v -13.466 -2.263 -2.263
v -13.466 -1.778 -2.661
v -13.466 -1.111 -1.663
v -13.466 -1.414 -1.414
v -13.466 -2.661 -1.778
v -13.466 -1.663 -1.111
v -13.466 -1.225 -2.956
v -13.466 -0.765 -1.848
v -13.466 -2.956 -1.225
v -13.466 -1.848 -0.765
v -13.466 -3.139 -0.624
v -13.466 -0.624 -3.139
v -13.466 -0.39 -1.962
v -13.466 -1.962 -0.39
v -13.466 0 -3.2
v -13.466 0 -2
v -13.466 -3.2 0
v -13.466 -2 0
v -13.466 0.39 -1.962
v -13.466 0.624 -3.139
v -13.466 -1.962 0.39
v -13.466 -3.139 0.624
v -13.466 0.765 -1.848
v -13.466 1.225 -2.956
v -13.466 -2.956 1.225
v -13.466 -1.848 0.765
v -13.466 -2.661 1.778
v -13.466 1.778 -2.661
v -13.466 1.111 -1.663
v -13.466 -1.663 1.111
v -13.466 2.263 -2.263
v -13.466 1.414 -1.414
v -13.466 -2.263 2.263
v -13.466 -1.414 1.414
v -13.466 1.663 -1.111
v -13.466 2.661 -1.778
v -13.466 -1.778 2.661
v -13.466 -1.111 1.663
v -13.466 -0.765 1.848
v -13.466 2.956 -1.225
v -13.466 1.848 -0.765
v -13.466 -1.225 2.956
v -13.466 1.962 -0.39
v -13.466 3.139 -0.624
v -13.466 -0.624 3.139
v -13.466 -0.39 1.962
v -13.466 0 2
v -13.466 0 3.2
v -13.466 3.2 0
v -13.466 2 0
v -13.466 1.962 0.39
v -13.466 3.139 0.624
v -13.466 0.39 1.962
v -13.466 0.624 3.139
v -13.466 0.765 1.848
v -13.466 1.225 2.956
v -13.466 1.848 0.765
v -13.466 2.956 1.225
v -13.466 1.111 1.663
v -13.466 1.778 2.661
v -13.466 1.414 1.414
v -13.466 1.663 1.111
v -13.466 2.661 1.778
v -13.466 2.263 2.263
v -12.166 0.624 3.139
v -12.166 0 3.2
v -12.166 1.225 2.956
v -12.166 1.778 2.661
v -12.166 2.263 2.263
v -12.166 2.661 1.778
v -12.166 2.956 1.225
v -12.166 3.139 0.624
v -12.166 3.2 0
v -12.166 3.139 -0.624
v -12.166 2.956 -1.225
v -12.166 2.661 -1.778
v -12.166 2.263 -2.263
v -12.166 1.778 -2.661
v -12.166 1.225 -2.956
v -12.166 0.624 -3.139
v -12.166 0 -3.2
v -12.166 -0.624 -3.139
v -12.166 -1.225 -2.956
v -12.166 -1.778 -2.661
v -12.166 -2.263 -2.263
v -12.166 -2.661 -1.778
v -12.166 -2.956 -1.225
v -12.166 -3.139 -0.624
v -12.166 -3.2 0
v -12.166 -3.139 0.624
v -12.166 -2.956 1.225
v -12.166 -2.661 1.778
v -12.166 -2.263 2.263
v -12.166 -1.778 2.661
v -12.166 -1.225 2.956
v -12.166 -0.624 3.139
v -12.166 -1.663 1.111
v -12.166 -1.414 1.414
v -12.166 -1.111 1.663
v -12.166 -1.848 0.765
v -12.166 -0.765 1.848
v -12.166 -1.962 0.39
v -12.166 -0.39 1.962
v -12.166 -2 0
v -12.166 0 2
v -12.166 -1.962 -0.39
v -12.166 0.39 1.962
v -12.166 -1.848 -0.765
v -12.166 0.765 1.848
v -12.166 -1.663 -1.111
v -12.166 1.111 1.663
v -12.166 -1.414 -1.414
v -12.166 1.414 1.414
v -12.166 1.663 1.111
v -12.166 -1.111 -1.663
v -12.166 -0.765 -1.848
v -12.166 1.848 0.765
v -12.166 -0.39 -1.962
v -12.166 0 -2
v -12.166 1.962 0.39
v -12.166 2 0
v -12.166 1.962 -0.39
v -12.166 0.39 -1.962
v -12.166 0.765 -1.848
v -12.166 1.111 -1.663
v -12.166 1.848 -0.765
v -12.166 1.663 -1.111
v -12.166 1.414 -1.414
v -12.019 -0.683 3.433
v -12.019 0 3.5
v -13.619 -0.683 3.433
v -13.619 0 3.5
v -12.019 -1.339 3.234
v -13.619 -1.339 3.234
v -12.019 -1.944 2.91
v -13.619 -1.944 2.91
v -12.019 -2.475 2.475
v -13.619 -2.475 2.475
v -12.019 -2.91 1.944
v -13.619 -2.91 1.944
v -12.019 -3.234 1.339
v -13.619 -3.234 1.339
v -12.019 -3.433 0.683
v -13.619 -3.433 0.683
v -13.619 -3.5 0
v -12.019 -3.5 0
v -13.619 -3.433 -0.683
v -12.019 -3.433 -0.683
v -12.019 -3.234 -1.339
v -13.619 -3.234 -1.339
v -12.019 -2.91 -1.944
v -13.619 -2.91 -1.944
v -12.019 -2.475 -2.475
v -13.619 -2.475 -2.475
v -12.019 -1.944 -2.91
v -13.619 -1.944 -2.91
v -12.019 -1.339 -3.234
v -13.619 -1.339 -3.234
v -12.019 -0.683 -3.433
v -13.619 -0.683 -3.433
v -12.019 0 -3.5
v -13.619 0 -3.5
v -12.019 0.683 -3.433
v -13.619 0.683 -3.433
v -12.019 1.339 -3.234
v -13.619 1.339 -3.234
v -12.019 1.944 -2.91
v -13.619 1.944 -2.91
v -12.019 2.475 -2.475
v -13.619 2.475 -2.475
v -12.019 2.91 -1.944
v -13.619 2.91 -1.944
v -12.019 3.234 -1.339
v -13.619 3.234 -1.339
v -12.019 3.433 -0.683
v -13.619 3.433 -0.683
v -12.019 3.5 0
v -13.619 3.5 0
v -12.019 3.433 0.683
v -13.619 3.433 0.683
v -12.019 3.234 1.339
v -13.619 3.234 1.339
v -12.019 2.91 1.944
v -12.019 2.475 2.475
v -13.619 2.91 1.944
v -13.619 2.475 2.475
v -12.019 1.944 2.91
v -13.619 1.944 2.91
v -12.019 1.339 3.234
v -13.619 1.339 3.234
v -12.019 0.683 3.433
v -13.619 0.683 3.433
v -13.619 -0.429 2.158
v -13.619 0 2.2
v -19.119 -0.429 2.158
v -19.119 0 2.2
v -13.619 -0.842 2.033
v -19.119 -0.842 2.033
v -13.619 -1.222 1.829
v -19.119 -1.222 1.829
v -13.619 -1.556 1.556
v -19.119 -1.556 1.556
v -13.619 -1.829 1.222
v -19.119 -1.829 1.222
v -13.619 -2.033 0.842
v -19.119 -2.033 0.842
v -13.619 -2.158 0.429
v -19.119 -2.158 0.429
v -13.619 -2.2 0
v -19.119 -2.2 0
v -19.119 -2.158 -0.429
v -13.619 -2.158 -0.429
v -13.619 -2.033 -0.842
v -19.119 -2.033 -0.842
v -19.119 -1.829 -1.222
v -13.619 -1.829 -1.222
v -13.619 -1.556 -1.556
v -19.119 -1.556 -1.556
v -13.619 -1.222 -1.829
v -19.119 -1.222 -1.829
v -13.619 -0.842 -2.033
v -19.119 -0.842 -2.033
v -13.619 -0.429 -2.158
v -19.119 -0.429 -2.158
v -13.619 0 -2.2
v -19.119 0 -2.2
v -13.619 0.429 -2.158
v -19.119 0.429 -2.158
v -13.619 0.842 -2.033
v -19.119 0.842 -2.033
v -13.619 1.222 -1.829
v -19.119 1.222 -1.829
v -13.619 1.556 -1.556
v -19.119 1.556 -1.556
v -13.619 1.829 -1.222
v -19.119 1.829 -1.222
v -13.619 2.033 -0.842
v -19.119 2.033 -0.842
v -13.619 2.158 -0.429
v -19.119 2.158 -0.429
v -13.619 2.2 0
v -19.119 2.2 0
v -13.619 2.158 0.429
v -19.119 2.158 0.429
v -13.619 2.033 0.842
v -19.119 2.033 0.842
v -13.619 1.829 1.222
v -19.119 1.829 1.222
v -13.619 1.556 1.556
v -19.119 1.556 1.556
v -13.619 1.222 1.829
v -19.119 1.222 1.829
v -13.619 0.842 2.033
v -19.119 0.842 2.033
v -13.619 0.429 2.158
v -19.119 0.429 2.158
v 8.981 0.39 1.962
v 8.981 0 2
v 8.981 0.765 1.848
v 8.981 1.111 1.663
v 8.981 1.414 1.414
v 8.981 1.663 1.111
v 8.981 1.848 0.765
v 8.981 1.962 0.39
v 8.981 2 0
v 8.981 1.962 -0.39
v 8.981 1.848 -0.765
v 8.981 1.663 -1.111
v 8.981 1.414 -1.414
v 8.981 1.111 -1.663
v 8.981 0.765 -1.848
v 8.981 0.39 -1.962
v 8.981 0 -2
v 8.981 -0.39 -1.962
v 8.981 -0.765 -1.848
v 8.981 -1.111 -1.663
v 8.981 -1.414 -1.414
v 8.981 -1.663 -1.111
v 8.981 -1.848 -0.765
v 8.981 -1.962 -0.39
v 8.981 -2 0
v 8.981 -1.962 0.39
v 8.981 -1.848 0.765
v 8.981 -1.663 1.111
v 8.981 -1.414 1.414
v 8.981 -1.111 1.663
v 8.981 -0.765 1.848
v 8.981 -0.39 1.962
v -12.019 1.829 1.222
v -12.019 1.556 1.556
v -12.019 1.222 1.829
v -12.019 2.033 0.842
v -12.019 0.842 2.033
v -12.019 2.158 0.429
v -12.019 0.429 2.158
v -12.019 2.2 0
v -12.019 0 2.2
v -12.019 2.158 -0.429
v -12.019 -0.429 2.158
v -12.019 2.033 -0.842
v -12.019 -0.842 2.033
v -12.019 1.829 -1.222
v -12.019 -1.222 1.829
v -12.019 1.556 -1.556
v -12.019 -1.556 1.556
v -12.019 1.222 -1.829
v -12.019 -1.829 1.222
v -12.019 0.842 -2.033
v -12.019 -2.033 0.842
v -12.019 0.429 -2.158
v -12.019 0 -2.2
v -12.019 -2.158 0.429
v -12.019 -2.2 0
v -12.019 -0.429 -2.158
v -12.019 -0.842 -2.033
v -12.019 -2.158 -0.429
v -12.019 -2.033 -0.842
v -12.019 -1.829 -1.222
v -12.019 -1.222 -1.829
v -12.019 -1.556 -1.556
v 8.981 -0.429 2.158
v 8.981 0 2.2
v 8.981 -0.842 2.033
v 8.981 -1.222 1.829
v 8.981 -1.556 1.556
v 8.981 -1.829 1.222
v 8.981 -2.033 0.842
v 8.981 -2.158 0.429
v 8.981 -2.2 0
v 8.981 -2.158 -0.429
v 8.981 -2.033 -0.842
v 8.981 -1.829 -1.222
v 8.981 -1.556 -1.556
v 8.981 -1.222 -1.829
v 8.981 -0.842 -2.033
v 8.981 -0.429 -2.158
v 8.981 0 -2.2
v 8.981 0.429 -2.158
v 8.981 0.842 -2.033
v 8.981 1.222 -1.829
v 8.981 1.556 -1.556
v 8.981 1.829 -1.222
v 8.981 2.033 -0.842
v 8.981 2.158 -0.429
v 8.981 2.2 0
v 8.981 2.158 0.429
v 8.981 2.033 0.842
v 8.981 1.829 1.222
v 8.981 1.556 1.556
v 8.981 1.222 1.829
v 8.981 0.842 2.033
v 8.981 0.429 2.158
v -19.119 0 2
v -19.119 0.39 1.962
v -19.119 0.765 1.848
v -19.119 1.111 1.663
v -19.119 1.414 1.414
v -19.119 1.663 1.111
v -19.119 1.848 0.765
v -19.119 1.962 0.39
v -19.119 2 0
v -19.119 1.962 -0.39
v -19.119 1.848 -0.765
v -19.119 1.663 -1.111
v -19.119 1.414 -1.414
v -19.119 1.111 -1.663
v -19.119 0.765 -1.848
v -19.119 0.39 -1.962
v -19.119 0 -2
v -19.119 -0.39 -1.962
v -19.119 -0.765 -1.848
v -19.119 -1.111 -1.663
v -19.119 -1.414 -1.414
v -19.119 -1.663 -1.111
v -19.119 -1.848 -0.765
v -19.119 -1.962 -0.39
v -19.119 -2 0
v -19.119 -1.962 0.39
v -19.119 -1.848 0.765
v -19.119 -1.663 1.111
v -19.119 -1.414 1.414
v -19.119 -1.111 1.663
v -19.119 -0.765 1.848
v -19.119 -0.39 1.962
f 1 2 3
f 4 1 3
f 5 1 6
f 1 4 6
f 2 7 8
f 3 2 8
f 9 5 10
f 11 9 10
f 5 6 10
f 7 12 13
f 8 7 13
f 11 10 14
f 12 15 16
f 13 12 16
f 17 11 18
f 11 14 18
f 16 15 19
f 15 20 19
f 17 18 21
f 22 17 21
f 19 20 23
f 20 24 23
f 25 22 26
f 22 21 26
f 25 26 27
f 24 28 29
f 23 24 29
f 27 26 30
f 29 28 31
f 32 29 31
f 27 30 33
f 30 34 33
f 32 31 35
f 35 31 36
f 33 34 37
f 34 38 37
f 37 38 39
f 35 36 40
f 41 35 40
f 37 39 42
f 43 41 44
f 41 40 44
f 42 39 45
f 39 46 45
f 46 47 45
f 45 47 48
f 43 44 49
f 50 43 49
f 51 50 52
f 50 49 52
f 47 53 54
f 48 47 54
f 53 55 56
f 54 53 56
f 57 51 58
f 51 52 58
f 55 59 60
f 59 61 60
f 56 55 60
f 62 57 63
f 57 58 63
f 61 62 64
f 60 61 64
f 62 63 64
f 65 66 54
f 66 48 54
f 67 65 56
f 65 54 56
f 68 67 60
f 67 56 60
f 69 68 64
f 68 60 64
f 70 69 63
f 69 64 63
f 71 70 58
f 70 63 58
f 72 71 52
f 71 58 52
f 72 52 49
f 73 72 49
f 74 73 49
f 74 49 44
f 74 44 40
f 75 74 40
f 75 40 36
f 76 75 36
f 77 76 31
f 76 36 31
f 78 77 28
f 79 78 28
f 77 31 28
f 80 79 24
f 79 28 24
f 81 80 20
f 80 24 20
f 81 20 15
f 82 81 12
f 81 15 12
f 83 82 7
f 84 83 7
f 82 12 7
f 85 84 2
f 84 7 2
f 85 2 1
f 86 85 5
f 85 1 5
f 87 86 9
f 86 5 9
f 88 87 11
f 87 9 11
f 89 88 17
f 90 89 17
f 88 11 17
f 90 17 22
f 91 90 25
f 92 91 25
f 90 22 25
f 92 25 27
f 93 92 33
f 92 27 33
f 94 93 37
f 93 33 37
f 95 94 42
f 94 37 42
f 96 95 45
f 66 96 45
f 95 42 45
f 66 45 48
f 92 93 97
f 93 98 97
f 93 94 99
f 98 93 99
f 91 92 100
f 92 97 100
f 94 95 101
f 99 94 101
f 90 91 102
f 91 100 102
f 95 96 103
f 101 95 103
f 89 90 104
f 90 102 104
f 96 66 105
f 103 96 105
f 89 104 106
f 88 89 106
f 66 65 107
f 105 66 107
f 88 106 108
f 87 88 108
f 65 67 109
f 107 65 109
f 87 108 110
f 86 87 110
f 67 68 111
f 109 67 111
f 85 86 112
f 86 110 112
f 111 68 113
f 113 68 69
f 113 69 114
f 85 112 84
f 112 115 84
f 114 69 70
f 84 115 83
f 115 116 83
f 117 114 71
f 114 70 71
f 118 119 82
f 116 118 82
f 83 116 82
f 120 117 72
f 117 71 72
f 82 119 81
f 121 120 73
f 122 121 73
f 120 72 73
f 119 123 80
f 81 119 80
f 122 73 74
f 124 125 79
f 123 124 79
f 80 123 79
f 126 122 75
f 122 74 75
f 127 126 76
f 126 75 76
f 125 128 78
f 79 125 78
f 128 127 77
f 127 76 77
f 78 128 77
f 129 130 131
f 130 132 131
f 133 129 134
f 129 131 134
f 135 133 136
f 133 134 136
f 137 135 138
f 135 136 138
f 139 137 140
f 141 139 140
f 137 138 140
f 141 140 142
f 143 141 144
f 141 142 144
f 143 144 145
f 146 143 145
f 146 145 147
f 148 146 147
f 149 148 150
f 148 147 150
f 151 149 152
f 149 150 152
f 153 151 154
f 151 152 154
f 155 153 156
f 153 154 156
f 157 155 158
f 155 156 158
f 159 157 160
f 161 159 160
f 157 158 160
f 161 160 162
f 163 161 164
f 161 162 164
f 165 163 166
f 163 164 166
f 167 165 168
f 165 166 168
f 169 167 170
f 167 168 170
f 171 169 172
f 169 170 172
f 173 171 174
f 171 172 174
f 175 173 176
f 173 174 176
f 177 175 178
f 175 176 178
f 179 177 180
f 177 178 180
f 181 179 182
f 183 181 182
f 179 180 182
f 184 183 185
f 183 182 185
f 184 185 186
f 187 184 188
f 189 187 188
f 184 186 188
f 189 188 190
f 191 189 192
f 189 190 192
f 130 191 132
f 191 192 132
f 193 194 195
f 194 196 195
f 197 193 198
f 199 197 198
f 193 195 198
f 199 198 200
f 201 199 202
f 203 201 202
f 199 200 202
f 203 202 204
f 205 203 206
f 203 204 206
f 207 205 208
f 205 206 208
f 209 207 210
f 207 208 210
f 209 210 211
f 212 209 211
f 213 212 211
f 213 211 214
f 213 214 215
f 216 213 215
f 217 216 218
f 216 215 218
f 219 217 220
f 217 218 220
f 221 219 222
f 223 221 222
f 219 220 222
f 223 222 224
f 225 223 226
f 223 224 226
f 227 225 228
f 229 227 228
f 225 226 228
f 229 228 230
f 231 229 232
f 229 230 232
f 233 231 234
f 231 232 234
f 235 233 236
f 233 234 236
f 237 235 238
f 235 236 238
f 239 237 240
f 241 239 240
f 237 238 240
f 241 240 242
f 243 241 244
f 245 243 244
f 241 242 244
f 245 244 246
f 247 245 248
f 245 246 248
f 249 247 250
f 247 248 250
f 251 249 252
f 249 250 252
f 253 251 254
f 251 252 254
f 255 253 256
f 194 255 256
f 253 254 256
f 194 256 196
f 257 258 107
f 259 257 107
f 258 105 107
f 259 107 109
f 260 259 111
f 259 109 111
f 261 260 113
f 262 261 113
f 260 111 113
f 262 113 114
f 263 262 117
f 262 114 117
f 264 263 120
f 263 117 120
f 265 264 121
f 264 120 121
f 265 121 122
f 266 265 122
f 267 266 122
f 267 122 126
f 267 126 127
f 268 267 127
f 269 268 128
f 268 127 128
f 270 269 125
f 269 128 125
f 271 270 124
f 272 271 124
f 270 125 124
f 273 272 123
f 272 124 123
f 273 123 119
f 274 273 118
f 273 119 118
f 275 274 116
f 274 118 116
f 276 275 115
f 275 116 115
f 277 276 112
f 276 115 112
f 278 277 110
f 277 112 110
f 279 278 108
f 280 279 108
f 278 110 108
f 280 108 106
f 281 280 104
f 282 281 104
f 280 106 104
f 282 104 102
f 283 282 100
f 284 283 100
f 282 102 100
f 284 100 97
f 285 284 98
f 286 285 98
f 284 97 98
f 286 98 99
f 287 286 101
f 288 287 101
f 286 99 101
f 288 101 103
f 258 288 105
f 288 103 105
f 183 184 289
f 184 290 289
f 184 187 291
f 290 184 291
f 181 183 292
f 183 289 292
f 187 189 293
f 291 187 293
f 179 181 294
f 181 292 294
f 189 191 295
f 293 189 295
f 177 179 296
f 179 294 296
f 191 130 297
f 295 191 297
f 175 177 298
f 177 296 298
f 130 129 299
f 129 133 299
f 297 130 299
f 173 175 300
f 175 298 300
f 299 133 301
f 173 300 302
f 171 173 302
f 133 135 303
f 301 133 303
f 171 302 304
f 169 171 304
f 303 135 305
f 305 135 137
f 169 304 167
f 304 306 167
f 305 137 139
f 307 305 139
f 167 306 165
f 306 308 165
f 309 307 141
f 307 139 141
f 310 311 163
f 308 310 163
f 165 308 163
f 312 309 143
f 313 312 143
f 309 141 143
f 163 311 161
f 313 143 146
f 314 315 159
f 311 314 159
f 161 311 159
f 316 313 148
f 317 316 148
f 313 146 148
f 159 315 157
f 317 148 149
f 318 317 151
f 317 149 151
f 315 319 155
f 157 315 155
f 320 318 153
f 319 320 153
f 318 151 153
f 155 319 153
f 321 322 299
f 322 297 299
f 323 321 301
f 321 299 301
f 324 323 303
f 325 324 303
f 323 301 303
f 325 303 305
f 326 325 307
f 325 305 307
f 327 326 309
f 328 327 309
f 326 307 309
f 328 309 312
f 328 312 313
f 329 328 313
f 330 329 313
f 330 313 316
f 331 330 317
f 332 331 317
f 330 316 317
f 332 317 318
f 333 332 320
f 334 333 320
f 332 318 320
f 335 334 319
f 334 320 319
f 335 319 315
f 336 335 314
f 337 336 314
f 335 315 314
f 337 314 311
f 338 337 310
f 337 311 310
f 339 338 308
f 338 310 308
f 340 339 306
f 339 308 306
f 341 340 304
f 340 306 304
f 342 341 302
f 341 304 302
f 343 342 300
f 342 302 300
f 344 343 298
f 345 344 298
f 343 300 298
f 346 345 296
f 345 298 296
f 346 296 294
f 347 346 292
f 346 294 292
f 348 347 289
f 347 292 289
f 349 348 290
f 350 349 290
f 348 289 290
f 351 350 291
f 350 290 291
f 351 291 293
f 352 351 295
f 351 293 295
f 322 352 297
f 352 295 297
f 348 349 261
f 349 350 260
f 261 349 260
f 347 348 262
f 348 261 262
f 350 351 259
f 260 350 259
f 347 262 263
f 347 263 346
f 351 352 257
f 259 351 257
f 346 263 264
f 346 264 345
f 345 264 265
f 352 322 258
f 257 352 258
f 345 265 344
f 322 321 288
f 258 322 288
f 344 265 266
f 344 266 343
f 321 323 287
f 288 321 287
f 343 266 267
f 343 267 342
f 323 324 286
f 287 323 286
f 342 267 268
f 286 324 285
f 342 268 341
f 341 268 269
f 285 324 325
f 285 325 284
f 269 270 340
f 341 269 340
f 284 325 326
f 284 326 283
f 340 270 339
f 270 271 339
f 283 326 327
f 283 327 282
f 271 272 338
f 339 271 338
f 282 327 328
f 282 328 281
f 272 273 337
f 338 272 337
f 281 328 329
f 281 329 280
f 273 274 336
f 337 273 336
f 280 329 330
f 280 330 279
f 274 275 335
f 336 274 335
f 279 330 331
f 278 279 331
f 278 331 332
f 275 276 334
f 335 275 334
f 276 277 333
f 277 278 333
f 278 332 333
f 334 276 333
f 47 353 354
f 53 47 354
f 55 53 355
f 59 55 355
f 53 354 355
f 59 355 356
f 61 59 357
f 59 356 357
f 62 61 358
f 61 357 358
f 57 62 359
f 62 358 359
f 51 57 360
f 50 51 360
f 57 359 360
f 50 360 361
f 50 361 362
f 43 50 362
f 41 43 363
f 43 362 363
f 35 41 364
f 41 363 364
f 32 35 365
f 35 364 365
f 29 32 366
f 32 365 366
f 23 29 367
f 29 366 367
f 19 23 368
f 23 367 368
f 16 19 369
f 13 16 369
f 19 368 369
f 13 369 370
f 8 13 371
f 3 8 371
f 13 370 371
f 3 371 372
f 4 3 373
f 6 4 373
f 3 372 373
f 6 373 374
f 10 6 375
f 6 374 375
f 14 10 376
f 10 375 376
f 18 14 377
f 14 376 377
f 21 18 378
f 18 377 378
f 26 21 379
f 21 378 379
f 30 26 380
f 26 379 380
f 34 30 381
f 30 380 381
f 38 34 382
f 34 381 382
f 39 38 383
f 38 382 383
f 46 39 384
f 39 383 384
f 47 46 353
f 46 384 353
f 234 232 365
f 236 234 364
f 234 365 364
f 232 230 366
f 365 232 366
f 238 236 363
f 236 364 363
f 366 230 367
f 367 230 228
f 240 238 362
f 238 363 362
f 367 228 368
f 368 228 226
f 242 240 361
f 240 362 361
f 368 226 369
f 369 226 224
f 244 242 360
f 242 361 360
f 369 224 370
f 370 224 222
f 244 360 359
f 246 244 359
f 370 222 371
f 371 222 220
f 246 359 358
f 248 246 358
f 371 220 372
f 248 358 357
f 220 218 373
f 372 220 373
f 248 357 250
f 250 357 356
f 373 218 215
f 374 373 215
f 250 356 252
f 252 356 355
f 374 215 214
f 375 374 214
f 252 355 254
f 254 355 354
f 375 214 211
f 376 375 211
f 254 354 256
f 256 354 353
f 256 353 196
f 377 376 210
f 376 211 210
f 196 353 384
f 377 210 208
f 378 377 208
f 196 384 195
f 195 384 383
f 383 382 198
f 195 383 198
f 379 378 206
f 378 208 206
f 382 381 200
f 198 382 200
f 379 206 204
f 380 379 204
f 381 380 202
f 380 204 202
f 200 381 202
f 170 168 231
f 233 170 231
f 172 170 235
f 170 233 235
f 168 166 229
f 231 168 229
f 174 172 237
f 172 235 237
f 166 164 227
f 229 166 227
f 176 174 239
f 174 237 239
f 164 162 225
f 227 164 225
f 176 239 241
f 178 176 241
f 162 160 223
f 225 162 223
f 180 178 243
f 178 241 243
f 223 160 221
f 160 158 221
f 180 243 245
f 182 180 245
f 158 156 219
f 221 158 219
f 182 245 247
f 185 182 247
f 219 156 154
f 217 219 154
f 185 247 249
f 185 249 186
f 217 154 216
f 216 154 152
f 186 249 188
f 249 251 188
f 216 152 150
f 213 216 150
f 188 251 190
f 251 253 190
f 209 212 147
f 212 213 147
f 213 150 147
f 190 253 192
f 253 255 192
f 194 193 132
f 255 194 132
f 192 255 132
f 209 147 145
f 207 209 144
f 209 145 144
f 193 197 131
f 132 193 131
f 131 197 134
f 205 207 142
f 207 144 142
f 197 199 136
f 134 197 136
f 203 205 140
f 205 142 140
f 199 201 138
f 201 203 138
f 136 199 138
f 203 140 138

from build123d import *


with BuildPart() as f1:
    # F0 (on Front) → F1 (revolve)
    with BuildSketch(Plane.XZ):
        Polygon((-13.619311, 2.2), (-19.119311, 2.2), (-19.119311, 0), (8.980689, 0), (8.980689, 2.2), (-12.019311, 2.2), (-12.019311, 3.5), (-13.619311, 3.5), align=None)
    revolve(axis=Axis((-4.034162, 0, 0), (1, 0, 0)))

    # F2 (on Front) → F3 (revolve, cut)
    with BuildSketch(Plane.XZ):
        Polygon((-13.465806, 2), (-19.465806, 2), (-19.465806, 0), (10.834194, 0), (10.834194, 2), (-12.165806, 2), (-12.165806, 3.2), (-13.465806, 3.2), align=None)
    revolve(axis=Axis((-4.82097, 0, 0), (-1, 0, 0)), mode=Mode.SUBTRACT)


solid = f1.part
